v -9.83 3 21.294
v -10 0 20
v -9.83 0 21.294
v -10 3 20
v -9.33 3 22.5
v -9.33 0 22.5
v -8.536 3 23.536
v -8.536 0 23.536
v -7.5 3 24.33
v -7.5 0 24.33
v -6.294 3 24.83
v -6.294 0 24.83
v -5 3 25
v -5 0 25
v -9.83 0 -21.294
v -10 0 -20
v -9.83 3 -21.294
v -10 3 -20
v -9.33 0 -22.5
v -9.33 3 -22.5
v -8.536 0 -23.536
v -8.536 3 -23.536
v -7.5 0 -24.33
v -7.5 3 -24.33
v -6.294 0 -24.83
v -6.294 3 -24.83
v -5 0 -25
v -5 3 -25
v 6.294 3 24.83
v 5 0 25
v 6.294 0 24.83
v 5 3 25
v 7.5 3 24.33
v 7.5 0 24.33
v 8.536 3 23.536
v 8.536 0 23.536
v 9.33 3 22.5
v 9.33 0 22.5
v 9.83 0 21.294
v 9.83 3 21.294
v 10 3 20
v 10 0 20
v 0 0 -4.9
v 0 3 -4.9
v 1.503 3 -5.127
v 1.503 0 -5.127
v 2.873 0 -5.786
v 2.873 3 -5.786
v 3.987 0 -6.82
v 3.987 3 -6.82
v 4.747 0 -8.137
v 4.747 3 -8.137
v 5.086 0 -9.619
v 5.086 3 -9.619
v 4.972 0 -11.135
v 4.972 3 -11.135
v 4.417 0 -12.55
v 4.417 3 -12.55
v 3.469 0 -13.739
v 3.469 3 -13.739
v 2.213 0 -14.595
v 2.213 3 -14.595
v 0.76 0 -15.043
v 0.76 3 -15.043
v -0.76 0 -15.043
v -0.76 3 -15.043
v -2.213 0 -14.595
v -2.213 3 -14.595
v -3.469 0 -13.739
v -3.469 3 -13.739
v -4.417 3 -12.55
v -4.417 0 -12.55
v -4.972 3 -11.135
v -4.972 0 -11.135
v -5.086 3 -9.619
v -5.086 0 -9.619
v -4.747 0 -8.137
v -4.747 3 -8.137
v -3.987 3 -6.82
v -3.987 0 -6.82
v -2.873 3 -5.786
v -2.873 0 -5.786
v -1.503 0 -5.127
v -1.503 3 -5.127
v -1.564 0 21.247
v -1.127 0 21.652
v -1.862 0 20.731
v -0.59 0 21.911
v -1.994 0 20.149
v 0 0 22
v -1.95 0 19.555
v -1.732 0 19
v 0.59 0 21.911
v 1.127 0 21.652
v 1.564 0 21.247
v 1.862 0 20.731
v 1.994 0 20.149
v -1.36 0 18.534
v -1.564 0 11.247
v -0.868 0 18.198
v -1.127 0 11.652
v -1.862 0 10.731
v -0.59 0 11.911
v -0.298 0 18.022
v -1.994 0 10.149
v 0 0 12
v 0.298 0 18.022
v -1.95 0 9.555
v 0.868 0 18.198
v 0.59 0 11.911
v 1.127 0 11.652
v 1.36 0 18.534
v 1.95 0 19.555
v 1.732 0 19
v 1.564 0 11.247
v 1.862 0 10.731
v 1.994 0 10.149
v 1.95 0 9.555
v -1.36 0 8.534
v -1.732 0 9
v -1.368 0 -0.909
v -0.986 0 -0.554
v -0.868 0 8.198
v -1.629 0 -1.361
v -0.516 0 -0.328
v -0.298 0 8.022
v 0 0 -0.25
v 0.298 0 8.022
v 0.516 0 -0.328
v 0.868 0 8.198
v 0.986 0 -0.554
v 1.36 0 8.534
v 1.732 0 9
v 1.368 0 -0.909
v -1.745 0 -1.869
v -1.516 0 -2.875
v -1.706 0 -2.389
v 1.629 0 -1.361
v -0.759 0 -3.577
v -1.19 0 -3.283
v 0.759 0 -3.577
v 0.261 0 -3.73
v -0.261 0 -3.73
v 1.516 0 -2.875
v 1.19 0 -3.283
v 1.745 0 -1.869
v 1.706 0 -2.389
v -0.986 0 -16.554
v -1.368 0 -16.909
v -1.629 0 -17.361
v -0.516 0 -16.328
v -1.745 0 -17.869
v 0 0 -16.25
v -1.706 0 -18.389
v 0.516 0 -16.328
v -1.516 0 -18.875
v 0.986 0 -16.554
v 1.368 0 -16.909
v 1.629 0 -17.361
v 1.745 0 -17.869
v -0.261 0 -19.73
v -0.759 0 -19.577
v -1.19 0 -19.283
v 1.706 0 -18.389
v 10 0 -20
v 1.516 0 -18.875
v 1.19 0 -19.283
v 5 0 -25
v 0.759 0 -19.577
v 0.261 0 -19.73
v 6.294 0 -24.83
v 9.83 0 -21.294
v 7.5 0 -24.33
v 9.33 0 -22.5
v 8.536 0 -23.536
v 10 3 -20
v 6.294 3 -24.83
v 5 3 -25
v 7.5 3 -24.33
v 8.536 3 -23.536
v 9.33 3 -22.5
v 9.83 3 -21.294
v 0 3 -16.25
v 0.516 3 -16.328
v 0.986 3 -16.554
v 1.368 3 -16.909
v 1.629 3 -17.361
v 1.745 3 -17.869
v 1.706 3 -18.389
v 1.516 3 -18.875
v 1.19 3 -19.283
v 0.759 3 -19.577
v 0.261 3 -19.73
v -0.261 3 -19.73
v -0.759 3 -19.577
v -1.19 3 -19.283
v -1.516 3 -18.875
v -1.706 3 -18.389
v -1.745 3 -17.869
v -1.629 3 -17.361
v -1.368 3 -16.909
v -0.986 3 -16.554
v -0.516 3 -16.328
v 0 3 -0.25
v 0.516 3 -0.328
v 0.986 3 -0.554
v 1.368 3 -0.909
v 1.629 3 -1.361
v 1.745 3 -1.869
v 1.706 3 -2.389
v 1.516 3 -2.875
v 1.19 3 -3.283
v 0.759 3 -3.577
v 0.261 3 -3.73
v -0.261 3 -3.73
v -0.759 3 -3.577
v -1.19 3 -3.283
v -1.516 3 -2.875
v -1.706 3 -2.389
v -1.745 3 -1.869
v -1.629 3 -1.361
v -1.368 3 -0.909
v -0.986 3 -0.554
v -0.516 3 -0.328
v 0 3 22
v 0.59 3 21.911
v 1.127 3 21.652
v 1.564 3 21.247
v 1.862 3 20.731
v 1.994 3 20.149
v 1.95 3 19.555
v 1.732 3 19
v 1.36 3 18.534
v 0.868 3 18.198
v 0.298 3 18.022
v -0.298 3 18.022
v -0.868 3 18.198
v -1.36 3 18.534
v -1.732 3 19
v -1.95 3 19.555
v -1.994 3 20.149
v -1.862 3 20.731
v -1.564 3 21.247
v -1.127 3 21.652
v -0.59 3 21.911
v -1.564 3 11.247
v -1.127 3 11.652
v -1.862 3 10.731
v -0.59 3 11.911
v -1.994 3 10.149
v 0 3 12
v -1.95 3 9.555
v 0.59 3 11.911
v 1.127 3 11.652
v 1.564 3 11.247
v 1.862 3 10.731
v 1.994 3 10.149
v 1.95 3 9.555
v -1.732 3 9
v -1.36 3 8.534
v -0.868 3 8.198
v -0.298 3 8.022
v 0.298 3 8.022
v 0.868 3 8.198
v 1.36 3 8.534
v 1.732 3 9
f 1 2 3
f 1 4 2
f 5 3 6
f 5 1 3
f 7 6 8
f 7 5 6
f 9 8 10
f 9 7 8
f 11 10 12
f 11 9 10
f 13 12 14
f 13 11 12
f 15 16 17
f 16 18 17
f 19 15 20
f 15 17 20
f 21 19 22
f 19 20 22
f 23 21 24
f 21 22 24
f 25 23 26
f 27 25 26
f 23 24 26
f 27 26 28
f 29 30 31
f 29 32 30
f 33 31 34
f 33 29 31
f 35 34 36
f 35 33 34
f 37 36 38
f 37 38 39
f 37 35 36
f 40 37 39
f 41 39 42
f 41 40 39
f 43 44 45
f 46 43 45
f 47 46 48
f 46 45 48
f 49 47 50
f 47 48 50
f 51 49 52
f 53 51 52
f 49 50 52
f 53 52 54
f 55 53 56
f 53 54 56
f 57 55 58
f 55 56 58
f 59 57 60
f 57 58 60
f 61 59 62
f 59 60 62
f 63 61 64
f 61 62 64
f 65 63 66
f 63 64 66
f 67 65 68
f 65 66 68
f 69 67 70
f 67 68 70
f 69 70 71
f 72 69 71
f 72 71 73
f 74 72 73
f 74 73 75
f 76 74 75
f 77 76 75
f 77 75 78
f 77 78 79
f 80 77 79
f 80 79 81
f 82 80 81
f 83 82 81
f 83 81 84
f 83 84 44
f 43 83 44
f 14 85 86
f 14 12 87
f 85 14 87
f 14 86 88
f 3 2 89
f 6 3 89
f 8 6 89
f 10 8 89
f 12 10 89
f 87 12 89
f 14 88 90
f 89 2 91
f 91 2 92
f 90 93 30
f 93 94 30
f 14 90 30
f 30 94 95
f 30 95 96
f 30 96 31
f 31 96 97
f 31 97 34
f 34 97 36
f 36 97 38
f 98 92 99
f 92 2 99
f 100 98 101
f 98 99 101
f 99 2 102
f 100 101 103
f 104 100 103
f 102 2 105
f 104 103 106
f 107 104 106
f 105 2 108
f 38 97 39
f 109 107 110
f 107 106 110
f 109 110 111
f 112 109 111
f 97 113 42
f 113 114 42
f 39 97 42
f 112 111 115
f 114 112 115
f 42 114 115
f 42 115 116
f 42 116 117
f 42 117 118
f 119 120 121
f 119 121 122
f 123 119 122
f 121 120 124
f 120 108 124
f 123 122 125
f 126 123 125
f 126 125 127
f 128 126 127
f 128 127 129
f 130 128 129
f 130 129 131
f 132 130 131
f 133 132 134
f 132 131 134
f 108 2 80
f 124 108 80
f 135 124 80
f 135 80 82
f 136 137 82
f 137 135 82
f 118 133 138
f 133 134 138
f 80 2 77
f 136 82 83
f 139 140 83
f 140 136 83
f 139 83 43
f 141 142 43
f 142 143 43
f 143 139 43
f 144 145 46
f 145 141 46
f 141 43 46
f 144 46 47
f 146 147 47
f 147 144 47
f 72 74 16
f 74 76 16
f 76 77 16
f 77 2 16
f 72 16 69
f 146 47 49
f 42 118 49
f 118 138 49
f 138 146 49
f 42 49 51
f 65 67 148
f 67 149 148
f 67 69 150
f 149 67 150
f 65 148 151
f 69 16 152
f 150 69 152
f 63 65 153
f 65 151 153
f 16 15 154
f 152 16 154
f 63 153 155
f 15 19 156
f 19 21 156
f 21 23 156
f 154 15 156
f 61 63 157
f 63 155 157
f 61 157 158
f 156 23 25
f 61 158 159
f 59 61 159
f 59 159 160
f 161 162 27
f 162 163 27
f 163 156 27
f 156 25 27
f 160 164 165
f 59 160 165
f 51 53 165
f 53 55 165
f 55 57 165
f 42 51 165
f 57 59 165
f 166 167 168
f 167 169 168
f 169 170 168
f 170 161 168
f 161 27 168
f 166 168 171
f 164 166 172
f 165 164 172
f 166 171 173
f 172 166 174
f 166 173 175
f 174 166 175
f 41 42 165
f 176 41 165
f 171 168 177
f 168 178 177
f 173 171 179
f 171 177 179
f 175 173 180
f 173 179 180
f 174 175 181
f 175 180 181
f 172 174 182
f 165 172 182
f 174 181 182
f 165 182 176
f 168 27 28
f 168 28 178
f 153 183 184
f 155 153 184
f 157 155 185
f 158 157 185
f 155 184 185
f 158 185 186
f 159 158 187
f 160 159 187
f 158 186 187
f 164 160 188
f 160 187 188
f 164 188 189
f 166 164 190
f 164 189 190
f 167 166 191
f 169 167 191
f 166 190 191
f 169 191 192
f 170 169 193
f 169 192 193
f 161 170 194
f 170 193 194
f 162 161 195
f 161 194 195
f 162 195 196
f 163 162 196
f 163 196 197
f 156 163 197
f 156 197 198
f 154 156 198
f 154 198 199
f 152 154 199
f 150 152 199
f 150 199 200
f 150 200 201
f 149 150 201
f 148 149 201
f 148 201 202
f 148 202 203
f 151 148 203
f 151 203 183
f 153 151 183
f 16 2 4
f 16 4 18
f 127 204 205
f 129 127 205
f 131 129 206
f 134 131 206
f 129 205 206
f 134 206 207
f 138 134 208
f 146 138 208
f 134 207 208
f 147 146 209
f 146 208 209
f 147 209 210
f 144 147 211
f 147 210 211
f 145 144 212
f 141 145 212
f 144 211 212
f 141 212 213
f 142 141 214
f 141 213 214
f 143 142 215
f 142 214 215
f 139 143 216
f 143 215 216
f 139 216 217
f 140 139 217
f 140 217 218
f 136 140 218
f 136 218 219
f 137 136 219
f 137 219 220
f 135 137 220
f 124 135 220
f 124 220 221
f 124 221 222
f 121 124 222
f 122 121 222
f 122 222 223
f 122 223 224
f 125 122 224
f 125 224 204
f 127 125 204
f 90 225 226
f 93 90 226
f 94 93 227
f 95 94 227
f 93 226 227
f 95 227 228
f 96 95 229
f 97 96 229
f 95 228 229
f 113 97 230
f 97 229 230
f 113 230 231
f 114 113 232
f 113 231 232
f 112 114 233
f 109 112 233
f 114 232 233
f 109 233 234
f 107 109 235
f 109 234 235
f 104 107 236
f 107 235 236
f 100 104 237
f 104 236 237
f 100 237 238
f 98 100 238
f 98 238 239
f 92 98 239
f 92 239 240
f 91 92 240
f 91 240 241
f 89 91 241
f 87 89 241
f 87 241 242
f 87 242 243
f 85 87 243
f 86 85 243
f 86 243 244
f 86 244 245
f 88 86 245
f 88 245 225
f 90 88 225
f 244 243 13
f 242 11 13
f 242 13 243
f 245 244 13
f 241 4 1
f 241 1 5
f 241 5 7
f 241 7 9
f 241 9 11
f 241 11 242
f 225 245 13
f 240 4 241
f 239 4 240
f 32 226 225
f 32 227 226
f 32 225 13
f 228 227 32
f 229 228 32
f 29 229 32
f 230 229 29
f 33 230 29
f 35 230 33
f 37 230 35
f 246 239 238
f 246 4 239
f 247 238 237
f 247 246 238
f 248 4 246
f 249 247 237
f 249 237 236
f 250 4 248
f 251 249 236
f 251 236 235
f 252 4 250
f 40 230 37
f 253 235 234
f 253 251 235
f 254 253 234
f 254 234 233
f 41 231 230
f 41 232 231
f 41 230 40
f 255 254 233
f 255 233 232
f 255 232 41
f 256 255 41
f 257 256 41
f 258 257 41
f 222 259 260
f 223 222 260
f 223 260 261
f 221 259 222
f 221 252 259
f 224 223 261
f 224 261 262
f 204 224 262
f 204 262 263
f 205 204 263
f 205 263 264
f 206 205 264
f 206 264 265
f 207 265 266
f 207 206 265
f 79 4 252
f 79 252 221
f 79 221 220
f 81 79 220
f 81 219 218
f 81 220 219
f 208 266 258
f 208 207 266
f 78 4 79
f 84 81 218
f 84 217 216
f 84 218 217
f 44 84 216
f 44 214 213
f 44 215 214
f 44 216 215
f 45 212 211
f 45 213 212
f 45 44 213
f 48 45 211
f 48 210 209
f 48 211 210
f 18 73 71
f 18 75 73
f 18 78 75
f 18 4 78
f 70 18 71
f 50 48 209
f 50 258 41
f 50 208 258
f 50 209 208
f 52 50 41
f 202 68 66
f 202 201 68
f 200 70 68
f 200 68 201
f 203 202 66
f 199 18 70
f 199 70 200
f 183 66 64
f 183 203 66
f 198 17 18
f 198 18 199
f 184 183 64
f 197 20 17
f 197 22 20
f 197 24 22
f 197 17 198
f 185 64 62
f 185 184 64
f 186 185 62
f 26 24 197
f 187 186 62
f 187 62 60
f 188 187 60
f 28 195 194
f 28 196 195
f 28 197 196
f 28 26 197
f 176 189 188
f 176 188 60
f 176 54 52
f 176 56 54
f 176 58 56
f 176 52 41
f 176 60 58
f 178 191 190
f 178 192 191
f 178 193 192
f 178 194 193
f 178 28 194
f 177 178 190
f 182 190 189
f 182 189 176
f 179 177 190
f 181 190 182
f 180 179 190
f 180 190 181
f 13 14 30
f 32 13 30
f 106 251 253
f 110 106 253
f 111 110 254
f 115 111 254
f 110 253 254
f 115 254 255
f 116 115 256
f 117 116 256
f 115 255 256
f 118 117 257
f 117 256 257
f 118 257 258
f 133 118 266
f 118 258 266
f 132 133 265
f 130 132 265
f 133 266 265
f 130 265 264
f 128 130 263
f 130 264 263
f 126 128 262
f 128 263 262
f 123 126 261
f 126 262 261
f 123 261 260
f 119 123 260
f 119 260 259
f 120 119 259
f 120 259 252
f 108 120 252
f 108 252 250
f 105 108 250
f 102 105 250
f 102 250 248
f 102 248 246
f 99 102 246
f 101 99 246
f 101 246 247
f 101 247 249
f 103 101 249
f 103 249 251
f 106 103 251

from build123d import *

# Parameters (mm, degrees)
SKETCH1_W           = 20
SKETCH1_H           = 50
BOSS_EXTRUDE1_DEPTH = 3
SKETCH2_R           = 5.1
SKETCH2_R_2         = 1.75
SKETCH2_R_3         = 2
CUT_EXTRUDE1_DEPTH  = 28.092434368
FILLET1_R           = 5


with BuildPart() as part:
    # Sketch1 → Boss-Extrude1 (new body)
    with BuildSketch(Plane(origin=(0, 0, 0), x_dir=(1, 0, 0), z_dir=(0, 1, 0))):
        Rectangle(SKETCH1_W, SKETCH1_H)
    extrude(amount=BOSS_EXTRUDE1_DEPTH)

    # Sketch2 → Cut-Extrude1 (cut, through all)
    with BuildSketch(Plane(origin=(0, 3, 0), x_dir=(1, 0, 0), z_dir=(0, 1, 0))):
        with Locations(Location((0, 10, 0), (0, 0, 270))):
            Circle(SKETCH2_R)
        with Locations(Location((0, 18, 0), (0, 0, 270))):
            Circle(SKETCH2_R_2)
        with Locations(Location((0, 2, 0), (0, 0, 270))):
            Circle(SKETCH2_R_2)
        with Locations(Location((0, -10, 0), (0, 0, 270))):
            Circle(SKETCH2_R_3)
        with Locations(Location((0, -20, 0), (0, 0, 270))):
            Circle(SKETCH2_R_3)
    extrude(amount=-CUT_EXTRUDE1_DEPTH, mode=Mode.SUBTRACT)

    # Fillet1
    fillet1_edges = [part.edges().sort_by_distance(p)[0] for p in [
        (10, 1.5, 25),
        (-10, 1.5, 25),
        (-10, 1.5, -25),
        (10, 1.5, -25),
    ]]
    fillet(fillet1_edges, radius=FILLET1_R)


solid = part.part
